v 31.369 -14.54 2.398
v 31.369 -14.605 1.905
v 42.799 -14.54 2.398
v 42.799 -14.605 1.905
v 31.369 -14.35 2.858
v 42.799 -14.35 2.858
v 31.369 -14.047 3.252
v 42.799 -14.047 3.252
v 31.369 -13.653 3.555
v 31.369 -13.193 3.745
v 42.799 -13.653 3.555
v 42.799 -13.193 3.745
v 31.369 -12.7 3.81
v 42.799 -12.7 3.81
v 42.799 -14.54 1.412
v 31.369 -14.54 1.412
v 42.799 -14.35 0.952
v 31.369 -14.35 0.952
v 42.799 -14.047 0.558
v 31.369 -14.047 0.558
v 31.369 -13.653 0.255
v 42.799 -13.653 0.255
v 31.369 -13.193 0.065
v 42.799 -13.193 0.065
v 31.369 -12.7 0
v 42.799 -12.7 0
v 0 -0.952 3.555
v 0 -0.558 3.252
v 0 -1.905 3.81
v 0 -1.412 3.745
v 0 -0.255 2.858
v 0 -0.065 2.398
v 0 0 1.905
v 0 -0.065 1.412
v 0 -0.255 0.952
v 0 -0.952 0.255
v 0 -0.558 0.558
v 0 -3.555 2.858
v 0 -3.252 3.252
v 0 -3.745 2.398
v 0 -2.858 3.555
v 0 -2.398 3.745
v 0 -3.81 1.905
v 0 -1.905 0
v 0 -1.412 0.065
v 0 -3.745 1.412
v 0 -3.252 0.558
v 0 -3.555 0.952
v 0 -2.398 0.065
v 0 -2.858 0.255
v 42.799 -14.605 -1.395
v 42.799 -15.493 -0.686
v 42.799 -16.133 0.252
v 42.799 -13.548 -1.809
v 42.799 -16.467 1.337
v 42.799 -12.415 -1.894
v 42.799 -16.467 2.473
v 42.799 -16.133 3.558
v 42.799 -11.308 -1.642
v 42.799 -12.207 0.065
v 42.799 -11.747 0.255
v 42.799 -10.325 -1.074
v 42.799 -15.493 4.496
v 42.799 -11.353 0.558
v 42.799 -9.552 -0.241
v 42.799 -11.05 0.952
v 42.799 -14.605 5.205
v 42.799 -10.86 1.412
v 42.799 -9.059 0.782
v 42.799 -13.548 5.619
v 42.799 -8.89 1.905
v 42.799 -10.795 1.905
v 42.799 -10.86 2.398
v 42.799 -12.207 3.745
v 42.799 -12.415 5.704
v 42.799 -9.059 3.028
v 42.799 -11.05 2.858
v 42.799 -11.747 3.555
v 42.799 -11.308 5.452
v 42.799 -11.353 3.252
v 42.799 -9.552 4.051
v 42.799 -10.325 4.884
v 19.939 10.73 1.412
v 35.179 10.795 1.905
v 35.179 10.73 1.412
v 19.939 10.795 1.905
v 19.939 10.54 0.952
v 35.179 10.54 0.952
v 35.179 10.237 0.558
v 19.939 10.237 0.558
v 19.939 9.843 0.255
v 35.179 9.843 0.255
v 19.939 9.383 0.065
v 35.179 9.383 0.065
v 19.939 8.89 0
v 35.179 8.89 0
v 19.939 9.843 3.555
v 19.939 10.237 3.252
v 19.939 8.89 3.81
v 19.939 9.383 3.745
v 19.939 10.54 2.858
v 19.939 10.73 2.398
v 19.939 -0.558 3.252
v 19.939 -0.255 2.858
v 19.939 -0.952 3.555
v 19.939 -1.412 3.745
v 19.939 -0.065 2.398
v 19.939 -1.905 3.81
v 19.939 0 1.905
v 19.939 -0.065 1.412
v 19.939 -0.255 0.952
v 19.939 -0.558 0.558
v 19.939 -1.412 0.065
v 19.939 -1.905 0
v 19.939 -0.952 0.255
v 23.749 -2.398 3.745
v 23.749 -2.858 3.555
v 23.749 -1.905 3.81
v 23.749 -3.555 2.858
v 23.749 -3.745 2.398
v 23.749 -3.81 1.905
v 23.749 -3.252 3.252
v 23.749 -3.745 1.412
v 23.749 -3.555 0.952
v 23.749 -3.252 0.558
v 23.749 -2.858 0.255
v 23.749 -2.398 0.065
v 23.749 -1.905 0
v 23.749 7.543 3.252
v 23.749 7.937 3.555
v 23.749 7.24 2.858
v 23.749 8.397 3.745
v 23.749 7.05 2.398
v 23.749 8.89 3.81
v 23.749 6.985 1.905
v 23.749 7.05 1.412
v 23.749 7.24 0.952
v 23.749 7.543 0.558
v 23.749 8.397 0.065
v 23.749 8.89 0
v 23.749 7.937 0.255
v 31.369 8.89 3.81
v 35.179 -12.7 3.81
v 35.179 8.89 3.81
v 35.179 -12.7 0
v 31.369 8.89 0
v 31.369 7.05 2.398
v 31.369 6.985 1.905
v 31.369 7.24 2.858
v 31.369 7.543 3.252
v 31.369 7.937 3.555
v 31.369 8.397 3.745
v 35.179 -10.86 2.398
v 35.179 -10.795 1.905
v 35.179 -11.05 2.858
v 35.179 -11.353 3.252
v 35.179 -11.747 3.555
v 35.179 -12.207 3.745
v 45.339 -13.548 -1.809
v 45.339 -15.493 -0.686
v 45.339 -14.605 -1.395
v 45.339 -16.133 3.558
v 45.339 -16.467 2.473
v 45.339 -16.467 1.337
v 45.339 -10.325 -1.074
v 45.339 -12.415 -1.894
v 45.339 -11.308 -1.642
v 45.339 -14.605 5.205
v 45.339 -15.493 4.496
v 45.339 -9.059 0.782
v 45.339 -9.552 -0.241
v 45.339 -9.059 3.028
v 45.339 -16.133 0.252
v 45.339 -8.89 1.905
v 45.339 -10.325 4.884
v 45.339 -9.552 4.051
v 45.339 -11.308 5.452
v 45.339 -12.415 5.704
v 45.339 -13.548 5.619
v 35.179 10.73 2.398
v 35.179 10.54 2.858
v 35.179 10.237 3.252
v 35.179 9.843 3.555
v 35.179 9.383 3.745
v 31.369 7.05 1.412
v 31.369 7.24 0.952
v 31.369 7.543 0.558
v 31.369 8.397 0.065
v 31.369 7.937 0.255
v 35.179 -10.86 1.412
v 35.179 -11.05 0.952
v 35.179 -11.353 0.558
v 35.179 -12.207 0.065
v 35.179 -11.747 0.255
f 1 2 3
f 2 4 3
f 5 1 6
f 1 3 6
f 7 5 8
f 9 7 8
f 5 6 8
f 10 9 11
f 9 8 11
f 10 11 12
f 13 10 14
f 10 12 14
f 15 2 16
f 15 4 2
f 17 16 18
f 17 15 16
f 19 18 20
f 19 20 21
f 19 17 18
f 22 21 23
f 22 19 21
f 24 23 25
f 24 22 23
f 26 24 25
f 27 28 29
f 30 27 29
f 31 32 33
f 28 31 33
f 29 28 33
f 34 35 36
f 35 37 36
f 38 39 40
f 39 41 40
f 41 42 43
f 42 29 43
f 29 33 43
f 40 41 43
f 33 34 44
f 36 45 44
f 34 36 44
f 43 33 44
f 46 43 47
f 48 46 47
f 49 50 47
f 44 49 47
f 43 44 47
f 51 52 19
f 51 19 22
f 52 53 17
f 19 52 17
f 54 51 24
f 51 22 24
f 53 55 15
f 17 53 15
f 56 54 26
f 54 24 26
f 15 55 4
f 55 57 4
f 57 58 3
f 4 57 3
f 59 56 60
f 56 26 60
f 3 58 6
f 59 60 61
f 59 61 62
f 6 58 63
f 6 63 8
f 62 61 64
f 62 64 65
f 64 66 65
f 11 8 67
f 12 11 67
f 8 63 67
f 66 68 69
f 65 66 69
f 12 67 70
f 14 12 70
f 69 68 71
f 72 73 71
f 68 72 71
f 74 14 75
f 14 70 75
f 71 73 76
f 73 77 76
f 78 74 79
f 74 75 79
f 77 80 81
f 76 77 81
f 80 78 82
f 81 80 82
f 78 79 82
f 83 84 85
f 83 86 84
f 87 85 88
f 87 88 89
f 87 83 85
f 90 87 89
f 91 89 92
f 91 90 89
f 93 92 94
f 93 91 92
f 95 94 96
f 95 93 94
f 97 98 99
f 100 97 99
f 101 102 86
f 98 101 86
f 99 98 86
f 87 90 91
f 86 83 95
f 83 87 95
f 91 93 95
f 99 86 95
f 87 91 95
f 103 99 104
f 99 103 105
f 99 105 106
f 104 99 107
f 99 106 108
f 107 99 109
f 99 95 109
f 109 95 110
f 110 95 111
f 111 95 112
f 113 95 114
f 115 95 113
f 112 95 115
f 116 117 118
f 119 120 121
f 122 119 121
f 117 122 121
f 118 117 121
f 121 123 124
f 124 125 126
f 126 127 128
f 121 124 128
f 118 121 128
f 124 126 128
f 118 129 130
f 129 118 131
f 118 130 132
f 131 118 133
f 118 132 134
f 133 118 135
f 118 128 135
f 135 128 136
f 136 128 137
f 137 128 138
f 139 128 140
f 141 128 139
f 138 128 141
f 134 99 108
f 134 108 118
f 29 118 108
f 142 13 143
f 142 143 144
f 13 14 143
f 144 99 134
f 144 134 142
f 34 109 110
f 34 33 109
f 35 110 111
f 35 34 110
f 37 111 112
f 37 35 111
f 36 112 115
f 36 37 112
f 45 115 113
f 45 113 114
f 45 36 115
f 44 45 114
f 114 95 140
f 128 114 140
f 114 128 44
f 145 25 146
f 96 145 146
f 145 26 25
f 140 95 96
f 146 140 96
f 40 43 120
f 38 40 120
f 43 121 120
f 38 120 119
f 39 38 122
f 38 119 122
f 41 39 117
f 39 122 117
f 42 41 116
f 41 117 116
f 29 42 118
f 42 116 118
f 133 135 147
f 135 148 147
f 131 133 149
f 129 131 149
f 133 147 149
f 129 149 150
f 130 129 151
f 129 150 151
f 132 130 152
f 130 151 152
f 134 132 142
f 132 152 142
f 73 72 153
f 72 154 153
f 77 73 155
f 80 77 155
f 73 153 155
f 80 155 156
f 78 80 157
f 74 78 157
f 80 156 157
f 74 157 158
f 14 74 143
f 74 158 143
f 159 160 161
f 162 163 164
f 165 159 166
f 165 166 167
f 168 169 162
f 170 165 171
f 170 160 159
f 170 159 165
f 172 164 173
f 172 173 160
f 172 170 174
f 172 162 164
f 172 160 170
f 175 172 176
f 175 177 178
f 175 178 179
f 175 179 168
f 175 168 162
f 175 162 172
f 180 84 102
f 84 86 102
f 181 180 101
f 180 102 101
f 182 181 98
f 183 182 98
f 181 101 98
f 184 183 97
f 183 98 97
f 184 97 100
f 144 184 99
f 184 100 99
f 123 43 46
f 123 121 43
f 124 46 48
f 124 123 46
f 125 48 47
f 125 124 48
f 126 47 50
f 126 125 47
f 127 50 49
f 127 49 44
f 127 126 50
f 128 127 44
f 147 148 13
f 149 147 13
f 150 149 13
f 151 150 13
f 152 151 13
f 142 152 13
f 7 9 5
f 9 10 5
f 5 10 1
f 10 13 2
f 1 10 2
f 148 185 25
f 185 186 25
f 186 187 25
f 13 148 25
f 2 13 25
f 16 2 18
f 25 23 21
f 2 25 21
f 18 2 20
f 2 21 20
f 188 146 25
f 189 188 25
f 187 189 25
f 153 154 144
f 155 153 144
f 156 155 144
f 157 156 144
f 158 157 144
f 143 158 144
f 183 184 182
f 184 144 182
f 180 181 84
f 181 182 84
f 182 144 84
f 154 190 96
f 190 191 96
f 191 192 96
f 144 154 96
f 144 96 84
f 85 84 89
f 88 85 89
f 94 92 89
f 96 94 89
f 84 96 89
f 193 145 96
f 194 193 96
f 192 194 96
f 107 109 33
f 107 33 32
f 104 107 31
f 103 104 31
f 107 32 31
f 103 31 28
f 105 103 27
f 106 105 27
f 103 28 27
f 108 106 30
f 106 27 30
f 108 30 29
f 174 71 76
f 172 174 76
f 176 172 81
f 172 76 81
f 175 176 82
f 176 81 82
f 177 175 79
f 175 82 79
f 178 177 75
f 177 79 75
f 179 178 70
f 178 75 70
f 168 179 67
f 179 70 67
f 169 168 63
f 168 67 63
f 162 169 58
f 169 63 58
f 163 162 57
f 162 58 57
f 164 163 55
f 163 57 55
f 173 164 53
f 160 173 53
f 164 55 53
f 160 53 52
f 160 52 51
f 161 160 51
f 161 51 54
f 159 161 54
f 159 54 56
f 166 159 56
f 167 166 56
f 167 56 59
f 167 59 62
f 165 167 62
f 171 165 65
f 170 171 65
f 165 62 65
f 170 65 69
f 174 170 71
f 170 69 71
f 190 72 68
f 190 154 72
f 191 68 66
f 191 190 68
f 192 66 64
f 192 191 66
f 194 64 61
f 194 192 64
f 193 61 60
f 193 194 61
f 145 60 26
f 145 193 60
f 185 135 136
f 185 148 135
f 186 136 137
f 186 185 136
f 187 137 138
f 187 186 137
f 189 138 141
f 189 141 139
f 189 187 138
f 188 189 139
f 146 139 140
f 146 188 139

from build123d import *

# Parameters (mm, degrees)
F1_DEPTH = 3.81
F2_R     = 1.90499
F3_R     = 3.81
F4_DEPTH = 2.54


# Not quite as in the source:
# - a fillet or chamfer is up to 0.001 mm smaller than in the source, because OpenCascade refuses the exact size
# - ends of sketch curves that miss each other by under 0.0002 mm in the source are joined


with BuildPart() as f1:
    # F0 (on Top) → F1 (new body)
    with BuildSketch(Plane.XY):
        Polygon((19.939, 0), (0, 0), (0, -3.81), (23.749, -3.81), (23.749, 6.985), (31.369, 6.985), (31.369, -14.605), (42.799, -14.605), (42.799, -10.795), (35.179, -10.795), (35.179, 10.795), (19.939, 10.795), align=None)
    extrude(amount=F1_DEPTH)

    # F2 (radius 1.905 in the source; OpenCascade refuses exactly that, so slightly less here)
    f2_edges = [f1.edges().sort_by_distance(p)[0] for p in [
        (9.9695, 0, 3.81),
        (9.9695, 0, 0),
        (11.8745, -3.81, 3.81),
        (11.8745, -3.81, 0),
        (27.559, 10.795, 3.81),
        (27.559, 6.985, 3.81),
        (27.559, 6.985, 0),
        (27.559, 10.795, 0),
        (38.989, -10.795, 3.81),
        (37.084, -14.605, 3.81),
        (38.989, -10.795, 0),
        (37.084, -14.605, 0),
    ]]
    fillet(f2_edges, radius=F2_R)

    # F3 (on face) → F4 (join)
    with BuildSketch(Plane.YZ.offset(42.799)):
        with Locations((-12.7, 1.905)):
            Circle(F3_R)
        with BuildLine():
            ThreePointArc((-12.70001, 0), (-14.0470413471, 0.5579586529), (-14.605, 1.90499))
            ThreePointArc((-14.605, 1.90499), (-14.0470413471, 3.2520413471), (-12.70001, 3.81))
            ThreePointArc((-12.70001, 3.81), (-11.3529586529, 3.2520413471), (-10.795, 1.90501))
            ThreePointArc((-10.795, 1.90501), (-11.3529586529, 0.5579586529), (-12.70001, 0))
        make_face(mode=Mode.SUBTRACT)
        with BuildLine():
            ThreePointArc((-12.70001, 3.81), (-14.0470413471, 3.2520413471), (-14.605, 1.90501))
            ThreePointArc((-14.605, 1.90501), (-14.0470413471, 0.5579586529), (-12.70001, 0))
            ThreePointArc((-12.70001, 0), (-11.3529586529, 0.5579586529), (-10.795, 1.90499))
            ThreePointArc((-10.795, 1.90499), (-11.3529586529, 3.2520413471), (-12.70001, 3.81))
        make_face()
    extrude(amount=F4_DEPTH)


solid = f1.part
